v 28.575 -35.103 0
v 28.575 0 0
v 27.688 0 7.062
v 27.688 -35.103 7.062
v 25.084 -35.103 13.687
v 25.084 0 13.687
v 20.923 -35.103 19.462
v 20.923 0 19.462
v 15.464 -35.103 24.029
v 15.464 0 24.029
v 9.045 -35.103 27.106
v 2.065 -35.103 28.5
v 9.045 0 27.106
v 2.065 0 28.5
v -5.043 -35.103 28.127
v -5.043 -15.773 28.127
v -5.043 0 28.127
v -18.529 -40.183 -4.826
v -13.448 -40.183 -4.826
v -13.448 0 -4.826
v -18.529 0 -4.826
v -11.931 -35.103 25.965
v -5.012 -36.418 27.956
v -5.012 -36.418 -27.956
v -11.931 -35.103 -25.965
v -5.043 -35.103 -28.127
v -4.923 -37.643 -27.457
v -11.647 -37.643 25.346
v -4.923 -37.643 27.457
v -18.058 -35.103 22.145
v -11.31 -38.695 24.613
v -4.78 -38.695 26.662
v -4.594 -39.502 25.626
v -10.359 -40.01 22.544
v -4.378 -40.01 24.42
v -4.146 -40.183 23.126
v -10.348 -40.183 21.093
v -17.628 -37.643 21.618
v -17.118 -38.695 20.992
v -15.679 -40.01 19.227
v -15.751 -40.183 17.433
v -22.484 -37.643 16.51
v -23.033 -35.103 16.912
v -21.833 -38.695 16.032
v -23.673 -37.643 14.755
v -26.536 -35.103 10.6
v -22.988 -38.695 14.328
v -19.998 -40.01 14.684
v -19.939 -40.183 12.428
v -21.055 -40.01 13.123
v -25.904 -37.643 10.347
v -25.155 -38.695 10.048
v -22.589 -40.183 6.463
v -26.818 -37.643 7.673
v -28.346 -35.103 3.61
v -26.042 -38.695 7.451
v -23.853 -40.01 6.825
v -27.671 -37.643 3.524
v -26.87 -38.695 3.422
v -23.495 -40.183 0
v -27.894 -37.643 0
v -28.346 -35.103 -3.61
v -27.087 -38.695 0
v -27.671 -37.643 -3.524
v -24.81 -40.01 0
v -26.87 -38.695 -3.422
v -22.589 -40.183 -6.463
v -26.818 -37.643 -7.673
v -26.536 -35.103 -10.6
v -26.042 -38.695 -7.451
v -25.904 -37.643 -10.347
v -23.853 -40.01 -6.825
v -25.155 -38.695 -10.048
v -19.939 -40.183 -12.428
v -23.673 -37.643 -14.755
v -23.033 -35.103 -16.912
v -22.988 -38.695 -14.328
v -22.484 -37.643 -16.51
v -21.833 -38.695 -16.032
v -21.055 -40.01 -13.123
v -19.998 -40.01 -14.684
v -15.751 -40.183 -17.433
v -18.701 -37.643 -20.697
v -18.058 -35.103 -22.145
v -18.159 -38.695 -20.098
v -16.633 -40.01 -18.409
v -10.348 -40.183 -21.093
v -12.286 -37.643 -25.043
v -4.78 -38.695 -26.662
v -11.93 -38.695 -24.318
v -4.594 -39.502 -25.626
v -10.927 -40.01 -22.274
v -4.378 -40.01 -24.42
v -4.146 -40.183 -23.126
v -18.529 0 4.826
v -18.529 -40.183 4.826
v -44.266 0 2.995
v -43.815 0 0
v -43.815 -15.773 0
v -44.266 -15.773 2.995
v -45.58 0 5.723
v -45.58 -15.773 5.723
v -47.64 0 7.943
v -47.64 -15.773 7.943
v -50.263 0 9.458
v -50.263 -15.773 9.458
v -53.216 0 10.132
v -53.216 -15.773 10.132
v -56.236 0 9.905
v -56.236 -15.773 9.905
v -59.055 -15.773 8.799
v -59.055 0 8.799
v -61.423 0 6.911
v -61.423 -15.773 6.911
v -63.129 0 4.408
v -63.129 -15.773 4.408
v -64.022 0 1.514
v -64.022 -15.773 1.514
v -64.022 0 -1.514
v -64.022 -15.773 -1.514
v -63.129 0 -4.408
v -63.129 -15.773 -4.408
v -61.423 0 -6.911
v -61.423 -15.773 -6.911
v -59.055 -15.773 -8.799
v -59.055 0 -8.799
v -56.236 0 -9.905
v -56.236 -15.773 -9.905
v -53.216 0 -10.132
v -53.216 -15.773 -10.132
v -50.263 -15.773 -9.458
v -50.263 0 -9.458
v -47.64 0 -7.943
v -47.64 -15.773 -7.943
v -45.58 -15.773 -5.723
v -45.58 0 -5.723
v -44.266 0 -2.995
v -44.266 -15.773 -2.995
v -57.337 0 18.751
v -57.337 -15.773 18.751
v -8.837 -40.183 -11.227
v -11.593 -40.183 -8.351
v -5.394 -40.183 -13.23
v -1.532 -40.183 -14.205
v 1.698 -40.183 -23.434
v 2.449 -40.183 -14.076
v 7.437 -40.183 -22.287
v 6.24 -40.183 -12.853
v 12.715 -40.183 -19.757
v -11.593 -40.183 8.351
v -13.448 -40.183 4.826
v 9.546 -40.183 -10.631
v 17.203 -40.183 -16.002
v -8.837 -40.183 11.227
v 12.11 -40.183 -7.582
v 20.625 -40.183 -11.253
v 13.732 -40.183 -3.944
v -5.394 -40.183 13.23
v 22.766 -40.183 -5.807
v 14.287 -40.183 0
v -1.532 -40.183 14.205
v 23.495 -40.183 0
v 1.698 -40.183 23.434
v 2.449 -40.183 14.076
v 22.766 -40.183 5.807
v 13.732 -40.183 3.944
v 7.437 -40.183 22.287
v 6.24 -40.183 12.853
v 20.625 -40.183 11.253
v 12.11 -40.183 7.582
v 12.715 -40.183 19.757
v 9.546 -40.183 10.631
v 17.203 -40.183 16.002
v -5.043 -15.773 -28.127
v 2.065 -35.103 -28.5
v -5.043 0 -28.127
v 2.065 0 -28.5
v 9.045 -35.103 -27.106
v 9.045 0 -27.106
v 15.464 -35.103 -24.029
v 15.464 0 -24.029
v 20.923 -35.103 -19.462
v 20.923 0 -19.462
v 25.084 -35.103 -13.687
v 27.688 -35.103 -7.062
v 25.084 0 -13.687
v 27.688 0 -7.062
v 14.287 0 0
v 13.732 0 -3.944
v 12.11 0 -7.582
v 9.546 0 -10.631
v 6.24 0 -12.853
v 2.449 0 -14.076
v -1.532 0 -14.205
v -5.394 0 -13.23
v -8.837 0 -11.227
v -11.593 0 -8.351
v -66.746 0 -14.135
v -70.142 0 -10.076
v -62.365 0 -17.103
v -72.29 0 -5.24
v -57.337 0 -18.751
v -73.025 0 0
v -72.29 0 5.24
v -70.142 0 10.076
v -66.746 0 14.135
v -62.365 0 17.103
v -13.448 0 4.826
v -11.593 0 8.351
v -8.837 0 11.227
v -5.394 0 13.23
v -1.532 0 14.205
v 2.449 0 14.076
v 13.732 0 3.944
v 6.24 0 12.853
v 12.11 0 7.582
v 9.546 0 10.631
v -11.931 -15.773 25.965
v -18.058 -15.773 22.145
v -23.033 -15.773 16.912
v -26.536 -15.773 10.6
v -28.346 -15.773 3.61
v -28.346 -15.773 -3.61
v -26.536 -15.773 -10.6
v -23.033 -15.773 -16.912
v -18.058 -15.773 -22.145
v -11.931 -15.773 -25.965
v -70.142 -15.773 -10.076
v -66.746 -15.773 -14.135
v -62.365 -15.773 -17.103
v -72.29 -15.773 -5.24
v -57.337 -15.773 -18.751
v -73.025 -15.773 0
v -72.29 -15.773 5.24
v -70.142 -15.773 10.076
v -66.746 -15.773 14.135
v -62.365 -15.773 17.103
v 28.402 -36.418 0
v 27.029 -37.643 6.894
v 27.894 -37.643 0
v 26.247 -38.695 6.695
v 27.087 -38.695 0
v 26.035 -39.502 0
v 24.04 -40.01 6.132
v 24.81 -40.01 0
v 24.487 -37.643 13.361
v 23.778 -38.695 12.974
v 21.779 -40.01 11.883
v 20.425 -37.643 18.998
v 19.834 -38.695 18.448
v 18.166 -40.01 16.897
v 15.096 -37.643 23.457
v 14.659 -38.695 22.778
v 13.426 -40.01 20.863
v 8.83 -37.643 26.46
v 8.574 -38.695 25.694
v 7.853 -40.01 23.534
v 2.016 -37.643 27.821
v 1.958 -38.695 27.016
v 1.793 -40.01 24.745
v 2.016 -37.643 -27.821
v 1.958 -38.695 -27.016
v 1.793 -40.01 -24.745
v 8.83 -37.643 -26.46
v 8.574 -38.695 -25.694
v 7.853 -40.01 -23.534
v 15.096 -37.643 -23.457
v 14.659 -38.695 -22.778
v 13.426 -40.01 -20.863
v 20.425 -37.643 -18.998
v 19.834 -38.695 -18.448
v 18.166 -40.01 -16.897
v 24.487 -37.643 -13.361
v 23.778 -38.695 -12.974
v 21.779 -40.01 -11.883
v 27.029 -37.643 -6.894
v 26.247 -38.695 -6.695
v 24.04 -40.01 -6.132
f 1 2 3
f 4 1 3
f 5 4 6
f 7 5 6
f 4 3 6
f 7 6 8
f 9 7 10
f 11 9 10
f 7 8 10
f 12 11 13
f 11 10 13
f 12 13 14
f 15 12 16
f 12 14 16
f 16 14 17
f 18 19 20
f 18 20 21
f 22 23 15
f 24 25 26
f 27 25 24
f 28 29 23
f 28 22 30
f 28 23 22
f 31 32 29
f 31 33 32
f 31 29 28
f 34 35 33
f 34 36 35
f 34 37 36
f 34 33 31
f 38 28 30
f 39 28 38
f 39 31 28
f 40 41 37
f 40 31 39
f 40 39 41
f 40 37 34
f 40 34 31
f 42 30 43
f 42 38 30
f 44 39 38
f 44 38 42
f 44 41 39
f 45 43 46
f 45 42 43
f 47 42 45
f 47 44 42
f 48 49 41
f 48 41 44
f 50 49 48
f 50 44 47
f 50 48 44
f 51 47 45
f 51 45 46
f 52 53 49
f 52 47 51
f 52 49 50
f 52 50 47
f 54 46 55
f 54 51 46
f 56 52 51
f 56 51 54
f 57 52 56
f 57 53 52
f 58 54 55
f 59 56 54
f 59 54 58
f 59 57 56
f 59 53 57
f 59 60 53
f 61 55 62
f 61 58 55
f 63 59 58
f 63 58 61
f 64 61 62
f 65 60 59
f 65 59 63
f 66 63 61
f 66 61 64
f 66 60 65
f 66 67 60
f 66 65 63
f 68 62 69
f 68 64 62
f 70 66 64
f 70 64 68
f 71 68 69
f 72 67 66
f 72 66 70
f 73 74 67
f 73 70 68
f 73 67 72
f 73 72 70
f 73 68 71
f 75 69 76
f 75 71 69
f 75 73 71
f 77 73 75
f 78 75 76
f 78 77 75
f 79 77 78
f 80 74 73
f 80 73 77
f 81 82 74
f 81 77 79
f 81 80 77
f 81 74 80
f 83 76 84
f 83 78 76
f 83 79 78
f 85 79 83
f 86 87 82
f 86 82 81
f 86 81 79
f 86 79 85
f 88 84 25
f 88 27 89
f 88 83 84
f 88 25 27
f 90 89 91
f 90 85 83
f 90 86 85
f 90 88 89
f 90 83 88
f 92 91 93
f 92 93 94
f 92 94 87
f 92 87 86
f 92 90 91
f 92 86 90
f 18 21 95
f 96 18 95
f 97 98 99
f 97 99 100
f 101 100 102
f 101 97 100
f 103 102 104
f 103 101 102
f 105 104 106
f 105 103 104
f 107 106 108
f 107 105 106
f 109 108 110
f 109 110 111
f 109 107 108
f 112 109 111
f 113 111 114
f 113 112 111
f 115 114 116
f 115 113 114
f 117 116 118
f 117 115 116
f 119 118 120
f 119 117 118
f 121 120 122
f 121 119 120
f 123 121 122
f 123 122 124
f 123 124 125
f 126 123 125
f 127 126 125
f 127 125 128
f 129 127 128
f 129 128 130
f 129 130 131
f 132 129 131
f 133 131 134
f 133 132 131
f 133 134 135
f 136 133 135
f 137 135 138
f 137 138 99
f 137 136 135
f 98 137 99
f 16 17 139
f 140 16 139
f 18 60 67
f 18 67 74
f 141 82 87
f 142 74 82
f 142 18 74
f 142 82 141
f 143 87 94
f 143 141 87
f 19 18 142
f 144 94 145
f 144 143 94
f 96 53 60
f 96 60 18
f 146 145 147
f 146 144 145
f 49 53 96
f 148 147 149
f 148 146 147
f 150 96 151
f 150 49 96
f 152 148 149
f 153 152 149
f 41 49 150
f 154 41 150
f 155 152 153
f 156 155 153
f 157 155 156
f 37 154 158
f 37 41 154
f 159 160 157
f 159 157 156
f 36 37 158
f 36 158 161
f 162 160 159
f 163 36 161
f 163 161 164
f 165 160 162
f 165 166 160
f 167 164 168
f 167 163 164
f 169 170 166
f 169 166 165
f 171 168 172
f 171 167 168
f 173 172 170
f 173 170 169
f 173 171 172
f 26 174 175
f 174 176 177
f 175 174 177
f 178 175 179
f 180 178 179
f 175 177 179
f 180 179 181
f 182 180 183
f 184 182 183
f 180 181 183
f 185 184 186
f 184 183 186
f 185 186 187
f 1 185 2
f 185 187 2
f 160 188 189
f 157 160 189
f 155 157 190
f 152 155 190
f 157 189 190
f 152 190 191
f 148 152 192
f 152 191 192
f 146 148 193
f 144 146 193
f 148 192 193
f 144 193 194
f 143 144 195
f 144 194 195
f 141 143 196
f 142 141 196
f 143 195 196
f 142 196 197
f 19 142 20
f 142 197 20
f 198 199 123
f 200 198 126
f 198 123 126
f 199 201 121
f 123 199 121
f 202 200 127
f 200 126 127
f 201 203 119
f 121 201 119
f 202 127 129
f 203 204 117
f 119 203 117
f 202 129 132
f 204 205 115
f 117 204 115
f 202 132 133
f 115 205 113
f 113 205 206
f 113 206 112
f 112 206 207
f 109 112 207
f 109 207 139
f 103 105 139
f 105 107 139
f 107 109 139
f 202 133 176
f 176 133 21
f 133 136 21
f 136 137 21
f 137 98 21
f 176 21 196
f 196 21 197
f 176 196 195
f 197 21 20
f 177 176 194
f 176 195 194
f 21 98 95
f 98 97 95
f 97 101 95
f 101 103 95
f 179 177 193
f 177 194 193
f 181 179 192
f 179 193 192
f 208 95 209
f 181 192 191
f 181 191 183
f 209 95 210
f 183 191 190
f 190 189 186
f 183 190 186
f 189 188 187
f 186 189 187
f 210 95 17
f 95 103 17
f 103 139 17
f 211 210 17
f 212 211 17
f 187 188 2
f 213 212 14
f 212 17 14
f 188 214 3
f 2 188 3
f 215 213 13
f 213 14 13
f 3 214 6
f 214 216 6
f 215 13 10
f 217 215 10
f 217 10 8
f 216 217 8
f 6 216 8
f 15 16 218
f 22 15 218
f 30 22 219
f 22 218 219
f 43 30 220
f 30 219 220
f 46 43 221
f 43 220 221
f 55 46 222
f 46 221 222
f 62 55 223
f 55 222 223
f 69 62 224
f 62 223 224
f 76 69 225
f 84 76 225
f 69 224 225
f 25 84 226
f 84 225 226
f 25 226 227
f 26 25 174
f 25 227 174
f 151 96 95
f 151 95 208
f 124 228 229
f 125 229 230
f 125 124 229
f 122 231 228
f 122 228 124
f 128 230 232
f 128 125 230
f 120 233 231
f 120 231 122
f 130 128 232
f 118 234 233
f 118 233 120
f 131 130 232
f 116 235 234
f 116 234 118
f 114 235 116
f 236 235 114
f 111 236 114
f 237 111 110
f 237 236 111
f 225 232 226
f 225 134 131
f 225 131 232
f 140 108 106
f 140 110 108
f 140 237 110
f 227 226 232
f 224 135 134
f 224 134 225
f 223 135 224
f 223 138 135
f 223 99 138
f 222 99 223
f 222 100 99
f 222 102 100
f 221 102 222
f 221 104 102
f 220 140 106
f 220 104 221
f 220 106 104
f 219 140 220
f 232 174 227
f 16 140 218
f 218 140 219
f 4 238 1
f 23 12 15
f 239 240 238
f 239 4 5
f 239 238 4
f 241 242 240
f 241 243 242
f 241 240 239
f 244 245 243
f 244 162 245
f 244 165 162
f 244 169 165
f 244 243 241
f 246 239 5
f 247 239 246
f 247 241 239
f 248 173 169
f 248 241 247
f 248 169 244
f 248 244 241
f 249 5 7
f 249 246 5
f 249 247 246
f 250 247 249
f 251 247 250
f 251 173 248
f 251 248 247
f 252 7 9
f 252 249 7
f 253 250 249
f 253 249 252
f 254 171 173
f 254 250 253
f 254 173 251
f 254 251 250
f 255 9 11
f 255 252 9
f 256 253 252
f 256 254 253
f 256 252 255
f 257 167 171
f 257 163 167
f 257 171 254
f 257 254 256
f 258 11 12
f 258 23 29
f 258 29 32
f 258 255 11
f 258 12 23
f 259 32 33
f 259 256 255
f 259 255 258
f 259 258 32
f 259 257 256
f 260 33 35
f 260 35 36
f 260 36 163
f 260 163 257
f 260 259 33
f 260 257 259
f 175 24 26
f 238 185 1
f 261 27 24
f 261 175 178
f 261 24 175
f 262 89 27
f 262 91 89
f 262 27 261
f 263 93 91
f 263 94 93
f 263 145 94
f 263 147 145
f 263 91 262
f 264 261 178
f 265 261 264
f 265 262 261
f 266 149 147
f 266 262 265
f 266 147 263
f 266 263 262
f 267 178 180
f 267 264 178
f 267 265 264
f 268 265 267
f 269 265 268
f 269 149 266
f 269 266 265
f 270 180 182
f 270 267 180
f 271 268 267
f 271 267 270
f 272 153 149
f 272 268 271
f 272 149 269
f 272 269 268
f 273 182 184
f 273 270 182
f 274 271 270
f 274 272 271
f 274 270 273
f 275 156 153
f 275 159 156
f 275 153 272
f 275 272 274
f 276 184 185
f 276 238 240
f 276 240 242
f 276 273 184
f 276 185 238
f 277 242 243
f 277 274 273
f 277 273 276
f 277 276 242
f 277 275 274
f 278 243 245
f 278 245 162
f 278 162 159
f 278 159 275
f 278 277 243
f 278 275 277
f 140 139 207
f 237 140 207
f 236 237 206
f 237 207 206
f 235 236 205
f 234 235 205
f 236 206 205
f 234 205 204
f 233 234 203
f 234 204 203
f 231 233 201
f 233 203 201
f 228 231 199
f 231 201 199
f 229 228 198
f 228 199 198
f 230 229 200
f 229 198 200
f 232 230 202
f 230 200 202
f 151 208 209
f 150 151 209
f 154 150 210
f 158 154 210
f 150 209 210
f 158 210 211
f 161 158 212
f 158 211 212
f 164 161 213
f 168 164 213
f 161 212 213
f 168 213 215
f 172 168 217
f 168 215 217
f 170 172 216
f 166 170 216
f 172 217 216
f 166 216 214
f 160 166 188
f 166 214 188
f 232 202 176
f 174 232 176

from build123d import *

# Parameters (mm, degrees)
F1_DEPTH = 40.1828
F2_DEPTH = 15.7734
F0_R     = 10.16
F3_DEPTH = 15.7734
F4_R     = 5.08


with BuildPart() as f1:
    # F0 (on Front) → F1 (new body)
    with BuildSketch(Plane.XZ):
        with BuildLine():
            ThreePointArc((-5.042647, -28.126541), (18.336262, -21.916025), (28.575, 0))
            ThreePointArc((28.575, 0), (18.336262, 21.916025), (-5.042647, 28.126541))
            ThreePointArc((-5.042647, 28.126541), (-28.575, 0), (-5.042647, -28.126541))
        make_face()
        with BuildLine():
            ThreePointArc((-13.447765, 4.826), (2.449257, 14.076001), (14.2875, 0))
            ThreePointArc((14.2875, 0), (2.449257, -14.076001), (-13.447765, -4.826))
            Line((-13.447765, -4.826), (-18.5293, -4.826))
            Line((-18.5293, -4.826), (-18.5293, 4.826))
            Line((-18.5293, 4.826), (-13.447765, 4.826))
        make_face(mode=Mode.SUBTRACT)
    extrude(amount=F1_DEPTH)

    # F0 (on Front) → F2 (join)
    with BuildSketch(Plane.XZ):
        with BuildLine():
            ThreePointArc((-5.042647, -28.126541), (-28.575, 0), (-5.042647, 28.126541))
            Line((-5.042647, 28.126541), (-57.336765, 18.751028))
            ThreePointArc((-57.336765, 18.751028), (-41.750826, 14.610683), (-34.925, 0))
            ThreePointArc((-34.925, 0), (-41.750826, -14.610683), (-57.336765, -18.751028))
            Line((-57.336765, -18.751028), (-5.042647, -28.126541))
        make_face()
    extrude(amount=F2_DEPTH)

    # F0 (on Front) → F3 (join)
    with BuildSketch(Plane.XZ):
        with BuildLine():
            ThreePointArc((-34.925, 0), (-41.750826, 14.610683), (-57.336765, 18.751028))
            ThreePointArc((-57.336765, 18.751028), (-73.025, 0), (-57.336765, -18.751028))
            ThreePointArc((-57.336765, -18.751028), (-41.750826, -14.610683), (-34.925, 0))
        make_face()
        with Locations((-53.975, 0)):
            Circle(F0_R, mode=Mode.SUBTRACT)
    extrude(amount=F3_DEPTH)

    # F4
    f4_edges = [f1.edges().sort_by_distance(p)[0] for p in [
        (-28.575, -40.1828, 0),
    ]]
    fillet(f4_edges, radius=F4_R)


solid = f1.part
